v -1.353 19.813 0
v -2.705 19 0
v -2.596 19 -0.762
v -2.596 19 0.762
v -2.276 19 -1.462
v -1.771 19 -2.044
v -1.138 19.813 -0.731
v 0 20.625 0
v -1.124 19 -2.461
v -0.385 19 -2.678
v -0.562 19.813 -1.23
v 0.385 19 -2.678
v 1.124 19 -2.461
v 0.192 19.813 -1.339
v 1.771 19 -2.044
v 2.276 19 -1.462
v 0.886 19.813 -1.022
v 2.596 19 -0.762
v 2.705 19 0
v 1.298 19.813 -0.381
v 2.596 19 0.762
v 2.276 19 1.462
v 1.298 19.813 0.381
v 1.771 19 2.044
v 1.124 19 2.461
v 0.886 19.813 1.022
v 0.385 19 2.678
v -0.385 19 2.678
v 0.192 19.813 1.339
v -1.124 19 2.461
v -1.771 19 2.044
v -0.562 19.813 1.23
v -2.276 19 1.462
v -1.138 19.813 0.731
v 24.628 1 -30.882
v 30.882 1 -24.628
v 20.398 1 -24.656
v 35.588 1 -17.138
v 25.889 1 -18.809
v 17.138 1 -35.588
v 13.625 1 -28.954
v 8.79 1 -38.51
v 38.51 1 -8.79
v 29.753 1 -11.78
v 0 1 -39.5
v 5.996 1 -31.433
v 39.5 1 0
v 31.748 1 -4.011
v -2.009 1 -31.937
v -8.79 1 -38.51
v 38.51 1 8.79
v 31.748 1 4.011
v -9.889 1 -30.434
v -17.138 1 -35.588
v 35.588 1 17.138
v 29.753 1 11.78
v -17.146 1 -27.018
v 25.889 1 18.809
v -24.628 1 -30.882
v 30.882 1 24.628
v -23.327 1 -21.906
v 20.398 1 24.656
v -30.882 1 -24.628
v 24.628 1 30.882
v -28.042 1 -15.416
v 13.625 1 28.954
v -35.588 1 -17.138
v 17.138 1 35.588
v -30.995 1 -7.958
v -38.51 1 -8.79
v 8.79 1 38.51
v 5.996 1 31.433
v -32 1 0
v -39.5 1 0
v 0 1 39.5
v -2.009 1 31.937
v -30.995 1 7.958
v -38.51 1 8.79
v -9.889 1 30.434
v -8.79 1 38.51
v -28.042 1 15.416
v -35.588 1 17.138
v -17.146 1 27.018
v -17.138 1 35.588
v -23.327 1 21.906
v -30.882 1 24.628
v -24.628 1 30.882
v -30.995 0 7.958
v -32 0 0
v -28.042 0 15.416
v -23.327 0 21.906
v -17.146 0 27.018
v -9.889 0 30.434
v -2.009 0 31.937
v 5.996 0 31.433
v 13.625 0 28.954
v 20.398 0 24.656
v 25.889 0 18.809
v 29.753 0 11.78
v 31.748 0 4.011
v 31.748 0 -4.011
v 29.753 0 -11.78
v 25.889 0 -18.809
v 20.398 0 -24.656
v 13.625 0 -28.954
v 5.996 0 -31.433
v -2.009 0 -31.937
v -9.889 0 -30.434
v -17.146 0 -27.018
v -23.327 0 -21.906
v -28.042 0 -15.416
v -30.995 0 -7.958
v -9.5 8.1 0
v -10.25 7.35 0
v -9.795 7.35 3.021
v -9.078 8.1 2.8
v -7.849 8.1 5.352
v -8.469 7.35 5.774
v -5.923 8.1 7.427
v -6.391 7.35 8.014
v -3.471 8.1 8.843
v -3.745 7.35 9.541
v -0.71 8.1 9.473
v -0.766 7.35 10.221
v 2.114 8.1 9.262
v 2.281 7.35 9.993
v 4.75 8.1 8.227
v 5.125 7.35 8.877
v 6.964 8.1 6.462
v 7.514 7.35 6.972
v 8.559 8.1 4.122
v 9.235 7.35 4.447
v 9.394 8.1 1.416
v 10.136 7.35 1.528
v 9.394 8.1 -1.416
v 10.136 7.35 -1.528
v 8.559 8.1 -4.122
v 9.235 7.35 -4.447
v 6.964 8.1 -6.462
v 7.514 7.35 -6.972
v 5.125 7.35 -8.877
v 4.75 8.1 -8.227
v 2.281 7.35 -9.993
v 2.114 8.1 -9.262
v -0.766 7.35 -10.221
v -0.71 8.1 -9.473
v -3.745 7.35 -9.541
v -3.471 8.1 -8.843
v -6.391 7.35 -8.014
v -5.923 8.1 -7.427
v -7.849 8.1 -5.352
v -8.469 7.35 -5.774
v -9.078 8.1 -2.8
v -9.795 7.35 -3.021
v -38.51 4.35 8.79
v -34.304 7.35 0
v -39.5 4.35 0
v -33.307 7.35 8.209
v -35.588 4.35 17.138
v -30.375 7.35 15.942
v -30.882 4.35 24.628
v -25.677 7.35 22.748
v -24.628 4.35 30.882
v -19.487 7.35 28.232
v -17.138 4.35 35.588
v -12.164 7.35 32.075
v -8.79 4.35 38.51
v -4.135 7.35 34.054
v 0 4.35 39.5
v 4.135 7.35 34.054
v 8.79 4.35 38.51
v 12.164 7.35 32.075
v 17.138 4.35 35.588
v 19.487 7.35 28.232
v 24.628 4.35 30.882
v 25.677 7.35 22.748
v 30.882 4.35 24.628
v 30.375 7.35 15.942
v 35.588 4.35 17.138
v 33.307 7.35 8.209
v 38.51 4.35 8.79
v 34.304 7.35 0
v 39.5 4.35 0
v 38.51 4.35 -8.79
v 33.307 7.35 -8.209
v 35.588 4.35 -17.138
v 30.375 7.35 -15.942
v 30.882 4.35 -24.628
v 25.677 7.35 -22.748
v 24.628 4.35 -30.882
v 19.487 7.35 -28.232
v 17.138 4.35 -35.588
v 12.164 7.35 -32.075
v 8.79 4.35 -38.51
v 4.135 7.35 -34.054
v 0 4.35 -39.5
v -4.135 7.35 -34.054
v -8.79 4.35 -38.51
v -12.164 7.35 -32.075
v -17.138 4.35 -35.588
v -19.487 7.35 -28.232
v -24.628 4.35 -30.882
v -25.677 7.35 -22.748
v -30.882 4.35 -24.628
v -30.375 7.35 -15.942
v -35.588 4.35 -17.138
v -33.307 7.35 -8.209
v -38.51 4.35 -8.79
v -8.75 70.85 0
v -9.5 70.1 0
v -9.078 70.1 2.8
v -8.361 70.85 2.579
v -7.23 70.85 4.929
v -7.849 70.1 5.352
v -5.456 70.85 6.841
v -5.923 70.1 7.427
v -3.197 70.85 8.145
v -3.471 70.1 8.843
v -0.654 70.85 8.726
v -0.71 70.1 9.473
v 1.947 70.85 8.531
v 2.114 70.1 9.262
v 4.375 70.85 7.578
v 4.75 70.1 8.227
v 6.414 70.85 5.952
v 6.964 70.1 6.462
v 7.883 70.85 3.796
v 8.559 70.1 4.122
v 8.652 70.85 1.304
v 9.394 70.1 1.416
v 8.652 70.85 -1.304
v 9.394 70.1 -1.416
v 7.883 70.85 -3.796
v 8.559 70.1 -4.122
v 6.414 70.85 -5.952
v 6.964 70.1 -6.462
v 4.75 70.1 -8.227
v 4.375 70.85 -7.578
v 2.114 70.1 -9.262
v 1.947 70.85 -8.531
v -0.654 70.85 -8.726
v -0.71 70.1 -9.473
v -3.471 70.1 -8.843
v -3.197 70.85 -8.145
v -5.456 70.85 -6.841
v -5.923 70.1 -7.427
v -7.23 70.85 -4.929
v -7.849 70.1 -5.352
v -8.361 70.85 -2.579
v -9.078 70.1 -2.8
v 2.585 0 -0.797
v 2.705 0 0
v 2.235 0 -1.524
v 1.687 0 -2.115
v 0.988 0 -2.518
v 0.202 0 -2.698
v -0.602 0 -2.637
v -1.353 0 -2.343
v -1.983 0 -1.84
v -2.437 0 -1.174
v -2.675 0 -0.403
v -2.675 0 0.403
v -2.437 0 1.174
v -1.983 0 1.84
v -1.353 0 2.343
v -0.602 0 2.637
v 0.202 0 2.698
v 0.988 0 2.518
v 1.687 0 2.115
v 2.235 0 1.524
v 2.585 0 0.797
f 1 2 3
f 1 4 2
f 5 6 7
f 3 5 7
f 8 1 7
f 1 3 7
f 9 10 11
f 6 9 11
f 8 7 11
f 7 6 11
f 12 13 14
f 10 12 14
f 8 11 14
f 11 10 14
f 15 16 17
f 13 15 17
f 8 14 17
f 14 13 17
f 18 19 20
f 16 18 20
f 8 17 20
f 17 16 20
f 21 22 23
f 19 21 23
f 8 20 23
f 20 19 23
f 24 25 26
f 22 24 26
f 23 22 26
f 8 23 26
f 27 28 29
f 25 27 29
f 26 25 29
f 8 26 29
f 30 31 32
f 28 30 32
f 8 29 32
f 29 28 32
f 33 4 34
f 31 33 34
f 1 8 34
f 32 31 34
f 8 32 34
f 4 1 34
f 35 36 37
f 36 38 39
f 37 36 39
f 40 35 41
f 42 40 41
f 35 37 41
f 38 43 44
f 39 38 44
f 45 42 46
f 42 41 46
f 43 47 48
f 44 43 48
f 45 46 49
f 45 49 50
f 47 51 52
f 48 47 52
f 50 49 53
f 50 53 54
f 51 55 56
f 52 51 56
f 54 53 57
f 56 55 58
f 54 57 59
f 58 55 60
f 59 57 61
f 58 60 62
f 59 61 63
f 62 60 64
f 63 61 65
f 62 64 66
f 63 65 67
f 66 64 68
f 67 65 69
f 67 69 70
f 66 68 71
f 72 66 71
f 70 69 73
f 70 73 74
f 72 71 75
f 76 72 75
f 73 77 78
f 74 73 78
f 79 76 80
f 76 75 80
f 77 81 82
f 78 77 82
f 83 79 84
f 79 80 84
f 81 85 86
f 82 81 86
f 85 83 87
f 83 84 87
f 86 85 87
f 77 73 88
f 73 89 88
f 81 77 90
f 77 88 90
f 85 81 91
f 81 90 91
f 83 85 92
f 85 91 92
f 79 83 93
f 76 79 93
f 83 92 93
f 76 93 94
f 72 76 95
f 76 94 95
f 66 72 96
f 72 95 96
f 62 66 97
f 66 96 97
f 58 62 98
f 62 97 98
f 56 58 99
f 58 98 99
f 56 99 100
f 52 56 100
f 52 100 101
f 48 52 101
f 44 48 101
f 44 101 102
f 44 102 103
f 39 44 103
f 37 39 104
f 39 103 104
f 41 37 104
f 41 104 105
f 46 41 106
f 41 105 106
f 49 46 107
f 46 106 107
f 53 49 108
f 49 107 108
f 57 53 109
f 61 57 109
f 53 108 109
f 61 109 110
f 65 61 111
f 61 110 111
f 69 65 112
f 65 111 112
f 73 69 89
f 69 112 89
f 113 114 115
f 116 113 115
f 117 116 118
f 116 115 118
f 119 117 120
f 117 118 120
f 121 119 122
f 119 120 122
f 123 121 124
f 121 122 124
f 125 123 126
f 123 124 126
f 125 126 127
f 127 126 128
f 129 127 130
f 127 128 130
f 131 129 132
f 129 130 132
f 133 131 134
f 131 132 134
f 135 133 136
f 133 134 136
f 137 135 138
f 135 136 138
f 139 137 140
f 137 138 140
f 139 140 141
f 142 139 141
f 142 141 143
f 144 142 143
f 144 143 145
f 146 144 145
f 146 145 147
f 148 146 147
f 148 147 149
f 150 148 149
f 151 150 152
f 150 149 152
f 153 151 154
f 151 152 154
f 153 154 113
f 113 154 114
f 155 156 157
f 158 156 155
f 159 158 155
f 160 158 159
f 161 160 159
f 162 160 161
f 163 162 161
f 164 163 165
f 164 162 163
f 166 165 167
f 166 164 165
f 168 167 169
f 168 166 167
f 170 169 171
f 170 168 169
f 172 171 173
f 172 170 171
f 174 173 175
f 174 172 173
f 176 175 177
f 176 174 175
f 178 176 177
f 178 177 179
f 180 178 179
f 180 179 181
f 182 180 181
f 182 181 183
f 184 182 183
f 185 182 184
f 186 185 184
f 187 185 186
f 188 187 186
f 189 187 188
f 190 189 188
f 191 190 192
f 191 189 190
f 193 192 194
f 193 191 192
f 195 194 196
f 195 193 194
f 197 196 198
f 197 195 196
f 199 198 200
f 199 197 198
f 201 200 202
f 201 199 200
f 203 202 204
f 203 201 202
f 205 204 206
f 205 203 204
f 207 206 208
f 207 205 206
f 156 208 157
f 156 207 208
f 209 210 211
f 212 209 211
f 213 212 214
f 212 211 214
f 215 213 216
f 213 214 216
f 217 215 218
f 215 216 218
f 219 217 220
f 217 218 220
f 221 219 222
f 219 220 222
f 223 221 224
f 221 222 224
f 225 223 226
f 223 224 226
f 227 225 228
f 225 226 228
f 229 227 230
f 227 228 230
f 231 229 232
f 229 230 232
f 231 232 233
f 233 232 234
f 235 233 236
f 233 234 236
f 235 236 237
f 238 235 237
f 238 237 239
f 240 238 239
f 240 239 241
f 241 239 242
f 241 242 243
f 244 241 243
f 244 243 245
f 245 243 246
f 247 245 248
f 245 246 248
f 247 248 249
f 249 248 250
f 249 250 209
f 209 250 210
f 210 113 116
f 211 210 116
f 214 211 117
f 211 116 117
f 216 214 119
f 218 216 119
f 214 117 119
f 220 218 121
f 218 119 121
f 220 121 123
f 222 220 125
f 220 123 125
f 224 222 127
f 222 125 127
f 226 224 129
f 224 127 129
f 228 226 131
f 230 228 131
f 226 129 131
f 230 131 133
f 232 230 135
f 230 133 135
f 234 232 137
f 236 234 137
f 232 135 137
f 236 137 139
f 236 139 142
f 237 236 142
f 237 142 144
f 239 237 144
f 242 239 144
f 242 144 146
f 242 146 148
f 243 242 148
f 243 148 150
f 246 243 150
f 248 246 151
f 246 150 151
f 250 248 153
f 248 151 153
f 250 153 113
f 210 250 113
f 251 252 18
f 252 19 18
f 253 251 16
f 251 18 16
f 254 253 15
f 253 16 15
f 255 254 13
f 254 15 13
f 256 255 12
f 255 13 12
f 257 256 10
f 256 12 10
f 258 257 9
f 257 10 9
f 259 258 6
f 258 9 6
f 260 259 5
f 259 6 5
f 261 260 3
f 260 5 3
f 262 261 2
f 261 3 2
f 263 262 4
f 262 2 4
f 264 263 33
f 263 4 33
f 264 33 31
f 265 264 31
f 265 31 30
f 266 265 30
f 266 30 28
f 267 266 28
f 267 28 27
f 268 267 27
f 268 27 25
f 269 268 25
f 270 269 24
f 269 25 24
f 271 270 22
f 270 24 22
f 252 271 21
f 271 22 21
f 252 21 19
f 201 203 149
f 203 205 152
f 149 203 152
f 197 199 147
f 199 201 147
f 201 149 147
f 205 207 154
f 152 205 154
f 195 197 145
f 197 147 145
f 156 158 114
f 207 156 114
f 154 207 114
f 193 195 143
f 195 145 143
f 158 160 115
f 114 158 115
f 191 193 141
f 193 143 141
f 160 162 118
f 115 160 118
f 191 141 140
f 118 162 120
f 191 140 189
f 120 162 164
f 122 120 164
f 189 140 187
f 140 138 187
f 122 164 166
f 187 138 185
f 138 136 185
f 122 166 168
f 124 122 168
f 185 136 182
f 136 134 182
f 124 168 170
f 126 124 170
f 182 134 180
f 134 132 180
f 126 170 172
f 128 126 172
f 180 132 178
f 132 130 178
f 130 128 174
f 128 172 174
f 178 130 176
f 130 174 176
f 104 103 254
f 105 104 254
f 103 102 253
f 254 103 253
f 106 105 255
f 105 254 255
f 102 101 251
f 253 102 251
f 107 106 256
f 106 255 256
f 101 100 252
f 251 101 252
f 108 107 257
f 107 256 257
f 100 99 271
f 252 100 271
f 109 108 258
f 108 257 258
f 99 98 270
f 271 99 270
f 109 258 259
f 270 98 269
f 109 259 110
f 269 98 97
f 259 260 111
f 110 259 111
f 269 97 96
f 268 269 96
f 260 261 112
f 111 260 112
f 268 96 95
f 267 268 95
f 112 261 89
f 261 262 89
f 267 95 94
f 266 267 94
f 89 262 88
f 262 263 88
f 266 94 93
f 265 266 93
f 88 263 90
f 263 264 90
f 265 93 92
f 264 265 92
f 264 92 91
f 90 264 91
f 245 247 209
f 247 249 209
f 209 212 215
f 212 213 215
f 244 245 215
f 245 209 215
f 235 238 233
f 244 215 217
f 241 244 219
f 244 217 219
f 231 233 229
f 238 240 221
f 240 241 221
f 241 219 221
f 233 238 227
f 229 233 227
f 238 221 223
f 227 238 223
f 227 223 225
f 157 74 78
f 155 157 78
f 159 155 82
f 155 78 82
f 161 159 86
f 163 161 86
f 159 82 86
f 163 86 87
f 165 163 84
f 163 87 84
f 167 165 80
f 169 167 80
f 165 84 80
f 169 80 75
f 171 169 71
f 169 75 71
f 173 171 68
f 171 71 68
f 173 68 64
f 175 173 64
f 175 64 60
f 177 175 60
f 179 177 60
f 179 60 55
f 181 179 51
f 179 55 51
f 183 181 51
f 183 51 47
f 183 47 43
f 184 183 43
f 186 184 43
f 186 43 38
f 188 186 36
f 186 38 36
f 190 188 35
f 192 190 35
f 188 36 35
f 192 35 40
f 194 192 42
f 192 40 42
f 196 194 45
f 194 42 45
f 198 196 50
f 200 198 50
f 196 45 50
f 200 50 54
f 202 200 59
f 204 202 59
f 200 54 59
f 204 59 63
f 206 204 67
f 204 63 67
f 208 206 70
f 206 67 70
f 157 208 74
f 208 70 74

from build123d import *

# Parameters (mm, degrees)
CHAMFER1_SIZE               = 0.75
CHAMFER2_SIZE               = 3
CHAMFER2_SIZE2              = 5.196152423
F_1_4_28_TAPPED_HOLE2_D     = 5.4102
F_1_4_28_TAPPED_HOLE2_DEPTH = 19
F_1_4_28_TAPPED_HOLE2_TIP   = 1.625388061


with BuildPart() as part:
    # Sketch1 → Revolve1 (revolve)
    with BuildSketch(Plane.XY):
        Polygon((0, 0), (0, 70.85), (-9.5, 70.85), (-9.5, 7.35), (-39.5, 7.35), (-39.5, 1), (-32, 1), (-32, 0), align=None)
    revolve(axis=Axis((0, 0, 0), (0, 1, 0)))

    # Chamfer1
    chamfer1_edges = [part.edges().sort_by_distance(p)[0] for p in [
        (9.5, 7.35, 0),
        (9.5, 70.85, 0),
    ]]
    chamfer(chamfer1_edges, length=CHAMFER1_SIZE)

    # Chamfer2
    chamfer2_edges = [part.edges().sort_by_distance(p)[0] for p in [
        (39.5, 7.35, 0),
    ]]
    chamfer2_side = [part.faces().sort_by_distance(p)[0] for p in [
        (39.5, 4.175, 0),
    ]]
    chamfer(chamfer2_edges, length=CHAMFER2_SIZE, length2=CHAMFER2_SIZE2, reference=chamfer2_side[0])

    # 1/4-28 Tapped Hole2
    with Locations(Plane(origin=(0, 0, 0), x_dir=(-1, 0, 0), z_dir=(0, -1, 0))):
        with Locations((86.483740344, -12.823451155), (0, 0)):
            Hole(F_1_4_28_TAPPED_HOLE2_D / 2, depth=F_1_4_28_TAPPED_HOLE2_DEPTH)
            with Locations((0, 0, -(F_1_4_28_TAPPED_HOLE2_DEPTH + F_1_4_28_TAPPED_HOLE2_TIP / 2))):  # 118° drill point
                Cone(0, F_1_4_28_TAPPED_HOLE2_D / 2, F_1_4_28_TAPPED_HOLE2_TIP, mode=Mode.SUBTRACT)


solid = part.part
